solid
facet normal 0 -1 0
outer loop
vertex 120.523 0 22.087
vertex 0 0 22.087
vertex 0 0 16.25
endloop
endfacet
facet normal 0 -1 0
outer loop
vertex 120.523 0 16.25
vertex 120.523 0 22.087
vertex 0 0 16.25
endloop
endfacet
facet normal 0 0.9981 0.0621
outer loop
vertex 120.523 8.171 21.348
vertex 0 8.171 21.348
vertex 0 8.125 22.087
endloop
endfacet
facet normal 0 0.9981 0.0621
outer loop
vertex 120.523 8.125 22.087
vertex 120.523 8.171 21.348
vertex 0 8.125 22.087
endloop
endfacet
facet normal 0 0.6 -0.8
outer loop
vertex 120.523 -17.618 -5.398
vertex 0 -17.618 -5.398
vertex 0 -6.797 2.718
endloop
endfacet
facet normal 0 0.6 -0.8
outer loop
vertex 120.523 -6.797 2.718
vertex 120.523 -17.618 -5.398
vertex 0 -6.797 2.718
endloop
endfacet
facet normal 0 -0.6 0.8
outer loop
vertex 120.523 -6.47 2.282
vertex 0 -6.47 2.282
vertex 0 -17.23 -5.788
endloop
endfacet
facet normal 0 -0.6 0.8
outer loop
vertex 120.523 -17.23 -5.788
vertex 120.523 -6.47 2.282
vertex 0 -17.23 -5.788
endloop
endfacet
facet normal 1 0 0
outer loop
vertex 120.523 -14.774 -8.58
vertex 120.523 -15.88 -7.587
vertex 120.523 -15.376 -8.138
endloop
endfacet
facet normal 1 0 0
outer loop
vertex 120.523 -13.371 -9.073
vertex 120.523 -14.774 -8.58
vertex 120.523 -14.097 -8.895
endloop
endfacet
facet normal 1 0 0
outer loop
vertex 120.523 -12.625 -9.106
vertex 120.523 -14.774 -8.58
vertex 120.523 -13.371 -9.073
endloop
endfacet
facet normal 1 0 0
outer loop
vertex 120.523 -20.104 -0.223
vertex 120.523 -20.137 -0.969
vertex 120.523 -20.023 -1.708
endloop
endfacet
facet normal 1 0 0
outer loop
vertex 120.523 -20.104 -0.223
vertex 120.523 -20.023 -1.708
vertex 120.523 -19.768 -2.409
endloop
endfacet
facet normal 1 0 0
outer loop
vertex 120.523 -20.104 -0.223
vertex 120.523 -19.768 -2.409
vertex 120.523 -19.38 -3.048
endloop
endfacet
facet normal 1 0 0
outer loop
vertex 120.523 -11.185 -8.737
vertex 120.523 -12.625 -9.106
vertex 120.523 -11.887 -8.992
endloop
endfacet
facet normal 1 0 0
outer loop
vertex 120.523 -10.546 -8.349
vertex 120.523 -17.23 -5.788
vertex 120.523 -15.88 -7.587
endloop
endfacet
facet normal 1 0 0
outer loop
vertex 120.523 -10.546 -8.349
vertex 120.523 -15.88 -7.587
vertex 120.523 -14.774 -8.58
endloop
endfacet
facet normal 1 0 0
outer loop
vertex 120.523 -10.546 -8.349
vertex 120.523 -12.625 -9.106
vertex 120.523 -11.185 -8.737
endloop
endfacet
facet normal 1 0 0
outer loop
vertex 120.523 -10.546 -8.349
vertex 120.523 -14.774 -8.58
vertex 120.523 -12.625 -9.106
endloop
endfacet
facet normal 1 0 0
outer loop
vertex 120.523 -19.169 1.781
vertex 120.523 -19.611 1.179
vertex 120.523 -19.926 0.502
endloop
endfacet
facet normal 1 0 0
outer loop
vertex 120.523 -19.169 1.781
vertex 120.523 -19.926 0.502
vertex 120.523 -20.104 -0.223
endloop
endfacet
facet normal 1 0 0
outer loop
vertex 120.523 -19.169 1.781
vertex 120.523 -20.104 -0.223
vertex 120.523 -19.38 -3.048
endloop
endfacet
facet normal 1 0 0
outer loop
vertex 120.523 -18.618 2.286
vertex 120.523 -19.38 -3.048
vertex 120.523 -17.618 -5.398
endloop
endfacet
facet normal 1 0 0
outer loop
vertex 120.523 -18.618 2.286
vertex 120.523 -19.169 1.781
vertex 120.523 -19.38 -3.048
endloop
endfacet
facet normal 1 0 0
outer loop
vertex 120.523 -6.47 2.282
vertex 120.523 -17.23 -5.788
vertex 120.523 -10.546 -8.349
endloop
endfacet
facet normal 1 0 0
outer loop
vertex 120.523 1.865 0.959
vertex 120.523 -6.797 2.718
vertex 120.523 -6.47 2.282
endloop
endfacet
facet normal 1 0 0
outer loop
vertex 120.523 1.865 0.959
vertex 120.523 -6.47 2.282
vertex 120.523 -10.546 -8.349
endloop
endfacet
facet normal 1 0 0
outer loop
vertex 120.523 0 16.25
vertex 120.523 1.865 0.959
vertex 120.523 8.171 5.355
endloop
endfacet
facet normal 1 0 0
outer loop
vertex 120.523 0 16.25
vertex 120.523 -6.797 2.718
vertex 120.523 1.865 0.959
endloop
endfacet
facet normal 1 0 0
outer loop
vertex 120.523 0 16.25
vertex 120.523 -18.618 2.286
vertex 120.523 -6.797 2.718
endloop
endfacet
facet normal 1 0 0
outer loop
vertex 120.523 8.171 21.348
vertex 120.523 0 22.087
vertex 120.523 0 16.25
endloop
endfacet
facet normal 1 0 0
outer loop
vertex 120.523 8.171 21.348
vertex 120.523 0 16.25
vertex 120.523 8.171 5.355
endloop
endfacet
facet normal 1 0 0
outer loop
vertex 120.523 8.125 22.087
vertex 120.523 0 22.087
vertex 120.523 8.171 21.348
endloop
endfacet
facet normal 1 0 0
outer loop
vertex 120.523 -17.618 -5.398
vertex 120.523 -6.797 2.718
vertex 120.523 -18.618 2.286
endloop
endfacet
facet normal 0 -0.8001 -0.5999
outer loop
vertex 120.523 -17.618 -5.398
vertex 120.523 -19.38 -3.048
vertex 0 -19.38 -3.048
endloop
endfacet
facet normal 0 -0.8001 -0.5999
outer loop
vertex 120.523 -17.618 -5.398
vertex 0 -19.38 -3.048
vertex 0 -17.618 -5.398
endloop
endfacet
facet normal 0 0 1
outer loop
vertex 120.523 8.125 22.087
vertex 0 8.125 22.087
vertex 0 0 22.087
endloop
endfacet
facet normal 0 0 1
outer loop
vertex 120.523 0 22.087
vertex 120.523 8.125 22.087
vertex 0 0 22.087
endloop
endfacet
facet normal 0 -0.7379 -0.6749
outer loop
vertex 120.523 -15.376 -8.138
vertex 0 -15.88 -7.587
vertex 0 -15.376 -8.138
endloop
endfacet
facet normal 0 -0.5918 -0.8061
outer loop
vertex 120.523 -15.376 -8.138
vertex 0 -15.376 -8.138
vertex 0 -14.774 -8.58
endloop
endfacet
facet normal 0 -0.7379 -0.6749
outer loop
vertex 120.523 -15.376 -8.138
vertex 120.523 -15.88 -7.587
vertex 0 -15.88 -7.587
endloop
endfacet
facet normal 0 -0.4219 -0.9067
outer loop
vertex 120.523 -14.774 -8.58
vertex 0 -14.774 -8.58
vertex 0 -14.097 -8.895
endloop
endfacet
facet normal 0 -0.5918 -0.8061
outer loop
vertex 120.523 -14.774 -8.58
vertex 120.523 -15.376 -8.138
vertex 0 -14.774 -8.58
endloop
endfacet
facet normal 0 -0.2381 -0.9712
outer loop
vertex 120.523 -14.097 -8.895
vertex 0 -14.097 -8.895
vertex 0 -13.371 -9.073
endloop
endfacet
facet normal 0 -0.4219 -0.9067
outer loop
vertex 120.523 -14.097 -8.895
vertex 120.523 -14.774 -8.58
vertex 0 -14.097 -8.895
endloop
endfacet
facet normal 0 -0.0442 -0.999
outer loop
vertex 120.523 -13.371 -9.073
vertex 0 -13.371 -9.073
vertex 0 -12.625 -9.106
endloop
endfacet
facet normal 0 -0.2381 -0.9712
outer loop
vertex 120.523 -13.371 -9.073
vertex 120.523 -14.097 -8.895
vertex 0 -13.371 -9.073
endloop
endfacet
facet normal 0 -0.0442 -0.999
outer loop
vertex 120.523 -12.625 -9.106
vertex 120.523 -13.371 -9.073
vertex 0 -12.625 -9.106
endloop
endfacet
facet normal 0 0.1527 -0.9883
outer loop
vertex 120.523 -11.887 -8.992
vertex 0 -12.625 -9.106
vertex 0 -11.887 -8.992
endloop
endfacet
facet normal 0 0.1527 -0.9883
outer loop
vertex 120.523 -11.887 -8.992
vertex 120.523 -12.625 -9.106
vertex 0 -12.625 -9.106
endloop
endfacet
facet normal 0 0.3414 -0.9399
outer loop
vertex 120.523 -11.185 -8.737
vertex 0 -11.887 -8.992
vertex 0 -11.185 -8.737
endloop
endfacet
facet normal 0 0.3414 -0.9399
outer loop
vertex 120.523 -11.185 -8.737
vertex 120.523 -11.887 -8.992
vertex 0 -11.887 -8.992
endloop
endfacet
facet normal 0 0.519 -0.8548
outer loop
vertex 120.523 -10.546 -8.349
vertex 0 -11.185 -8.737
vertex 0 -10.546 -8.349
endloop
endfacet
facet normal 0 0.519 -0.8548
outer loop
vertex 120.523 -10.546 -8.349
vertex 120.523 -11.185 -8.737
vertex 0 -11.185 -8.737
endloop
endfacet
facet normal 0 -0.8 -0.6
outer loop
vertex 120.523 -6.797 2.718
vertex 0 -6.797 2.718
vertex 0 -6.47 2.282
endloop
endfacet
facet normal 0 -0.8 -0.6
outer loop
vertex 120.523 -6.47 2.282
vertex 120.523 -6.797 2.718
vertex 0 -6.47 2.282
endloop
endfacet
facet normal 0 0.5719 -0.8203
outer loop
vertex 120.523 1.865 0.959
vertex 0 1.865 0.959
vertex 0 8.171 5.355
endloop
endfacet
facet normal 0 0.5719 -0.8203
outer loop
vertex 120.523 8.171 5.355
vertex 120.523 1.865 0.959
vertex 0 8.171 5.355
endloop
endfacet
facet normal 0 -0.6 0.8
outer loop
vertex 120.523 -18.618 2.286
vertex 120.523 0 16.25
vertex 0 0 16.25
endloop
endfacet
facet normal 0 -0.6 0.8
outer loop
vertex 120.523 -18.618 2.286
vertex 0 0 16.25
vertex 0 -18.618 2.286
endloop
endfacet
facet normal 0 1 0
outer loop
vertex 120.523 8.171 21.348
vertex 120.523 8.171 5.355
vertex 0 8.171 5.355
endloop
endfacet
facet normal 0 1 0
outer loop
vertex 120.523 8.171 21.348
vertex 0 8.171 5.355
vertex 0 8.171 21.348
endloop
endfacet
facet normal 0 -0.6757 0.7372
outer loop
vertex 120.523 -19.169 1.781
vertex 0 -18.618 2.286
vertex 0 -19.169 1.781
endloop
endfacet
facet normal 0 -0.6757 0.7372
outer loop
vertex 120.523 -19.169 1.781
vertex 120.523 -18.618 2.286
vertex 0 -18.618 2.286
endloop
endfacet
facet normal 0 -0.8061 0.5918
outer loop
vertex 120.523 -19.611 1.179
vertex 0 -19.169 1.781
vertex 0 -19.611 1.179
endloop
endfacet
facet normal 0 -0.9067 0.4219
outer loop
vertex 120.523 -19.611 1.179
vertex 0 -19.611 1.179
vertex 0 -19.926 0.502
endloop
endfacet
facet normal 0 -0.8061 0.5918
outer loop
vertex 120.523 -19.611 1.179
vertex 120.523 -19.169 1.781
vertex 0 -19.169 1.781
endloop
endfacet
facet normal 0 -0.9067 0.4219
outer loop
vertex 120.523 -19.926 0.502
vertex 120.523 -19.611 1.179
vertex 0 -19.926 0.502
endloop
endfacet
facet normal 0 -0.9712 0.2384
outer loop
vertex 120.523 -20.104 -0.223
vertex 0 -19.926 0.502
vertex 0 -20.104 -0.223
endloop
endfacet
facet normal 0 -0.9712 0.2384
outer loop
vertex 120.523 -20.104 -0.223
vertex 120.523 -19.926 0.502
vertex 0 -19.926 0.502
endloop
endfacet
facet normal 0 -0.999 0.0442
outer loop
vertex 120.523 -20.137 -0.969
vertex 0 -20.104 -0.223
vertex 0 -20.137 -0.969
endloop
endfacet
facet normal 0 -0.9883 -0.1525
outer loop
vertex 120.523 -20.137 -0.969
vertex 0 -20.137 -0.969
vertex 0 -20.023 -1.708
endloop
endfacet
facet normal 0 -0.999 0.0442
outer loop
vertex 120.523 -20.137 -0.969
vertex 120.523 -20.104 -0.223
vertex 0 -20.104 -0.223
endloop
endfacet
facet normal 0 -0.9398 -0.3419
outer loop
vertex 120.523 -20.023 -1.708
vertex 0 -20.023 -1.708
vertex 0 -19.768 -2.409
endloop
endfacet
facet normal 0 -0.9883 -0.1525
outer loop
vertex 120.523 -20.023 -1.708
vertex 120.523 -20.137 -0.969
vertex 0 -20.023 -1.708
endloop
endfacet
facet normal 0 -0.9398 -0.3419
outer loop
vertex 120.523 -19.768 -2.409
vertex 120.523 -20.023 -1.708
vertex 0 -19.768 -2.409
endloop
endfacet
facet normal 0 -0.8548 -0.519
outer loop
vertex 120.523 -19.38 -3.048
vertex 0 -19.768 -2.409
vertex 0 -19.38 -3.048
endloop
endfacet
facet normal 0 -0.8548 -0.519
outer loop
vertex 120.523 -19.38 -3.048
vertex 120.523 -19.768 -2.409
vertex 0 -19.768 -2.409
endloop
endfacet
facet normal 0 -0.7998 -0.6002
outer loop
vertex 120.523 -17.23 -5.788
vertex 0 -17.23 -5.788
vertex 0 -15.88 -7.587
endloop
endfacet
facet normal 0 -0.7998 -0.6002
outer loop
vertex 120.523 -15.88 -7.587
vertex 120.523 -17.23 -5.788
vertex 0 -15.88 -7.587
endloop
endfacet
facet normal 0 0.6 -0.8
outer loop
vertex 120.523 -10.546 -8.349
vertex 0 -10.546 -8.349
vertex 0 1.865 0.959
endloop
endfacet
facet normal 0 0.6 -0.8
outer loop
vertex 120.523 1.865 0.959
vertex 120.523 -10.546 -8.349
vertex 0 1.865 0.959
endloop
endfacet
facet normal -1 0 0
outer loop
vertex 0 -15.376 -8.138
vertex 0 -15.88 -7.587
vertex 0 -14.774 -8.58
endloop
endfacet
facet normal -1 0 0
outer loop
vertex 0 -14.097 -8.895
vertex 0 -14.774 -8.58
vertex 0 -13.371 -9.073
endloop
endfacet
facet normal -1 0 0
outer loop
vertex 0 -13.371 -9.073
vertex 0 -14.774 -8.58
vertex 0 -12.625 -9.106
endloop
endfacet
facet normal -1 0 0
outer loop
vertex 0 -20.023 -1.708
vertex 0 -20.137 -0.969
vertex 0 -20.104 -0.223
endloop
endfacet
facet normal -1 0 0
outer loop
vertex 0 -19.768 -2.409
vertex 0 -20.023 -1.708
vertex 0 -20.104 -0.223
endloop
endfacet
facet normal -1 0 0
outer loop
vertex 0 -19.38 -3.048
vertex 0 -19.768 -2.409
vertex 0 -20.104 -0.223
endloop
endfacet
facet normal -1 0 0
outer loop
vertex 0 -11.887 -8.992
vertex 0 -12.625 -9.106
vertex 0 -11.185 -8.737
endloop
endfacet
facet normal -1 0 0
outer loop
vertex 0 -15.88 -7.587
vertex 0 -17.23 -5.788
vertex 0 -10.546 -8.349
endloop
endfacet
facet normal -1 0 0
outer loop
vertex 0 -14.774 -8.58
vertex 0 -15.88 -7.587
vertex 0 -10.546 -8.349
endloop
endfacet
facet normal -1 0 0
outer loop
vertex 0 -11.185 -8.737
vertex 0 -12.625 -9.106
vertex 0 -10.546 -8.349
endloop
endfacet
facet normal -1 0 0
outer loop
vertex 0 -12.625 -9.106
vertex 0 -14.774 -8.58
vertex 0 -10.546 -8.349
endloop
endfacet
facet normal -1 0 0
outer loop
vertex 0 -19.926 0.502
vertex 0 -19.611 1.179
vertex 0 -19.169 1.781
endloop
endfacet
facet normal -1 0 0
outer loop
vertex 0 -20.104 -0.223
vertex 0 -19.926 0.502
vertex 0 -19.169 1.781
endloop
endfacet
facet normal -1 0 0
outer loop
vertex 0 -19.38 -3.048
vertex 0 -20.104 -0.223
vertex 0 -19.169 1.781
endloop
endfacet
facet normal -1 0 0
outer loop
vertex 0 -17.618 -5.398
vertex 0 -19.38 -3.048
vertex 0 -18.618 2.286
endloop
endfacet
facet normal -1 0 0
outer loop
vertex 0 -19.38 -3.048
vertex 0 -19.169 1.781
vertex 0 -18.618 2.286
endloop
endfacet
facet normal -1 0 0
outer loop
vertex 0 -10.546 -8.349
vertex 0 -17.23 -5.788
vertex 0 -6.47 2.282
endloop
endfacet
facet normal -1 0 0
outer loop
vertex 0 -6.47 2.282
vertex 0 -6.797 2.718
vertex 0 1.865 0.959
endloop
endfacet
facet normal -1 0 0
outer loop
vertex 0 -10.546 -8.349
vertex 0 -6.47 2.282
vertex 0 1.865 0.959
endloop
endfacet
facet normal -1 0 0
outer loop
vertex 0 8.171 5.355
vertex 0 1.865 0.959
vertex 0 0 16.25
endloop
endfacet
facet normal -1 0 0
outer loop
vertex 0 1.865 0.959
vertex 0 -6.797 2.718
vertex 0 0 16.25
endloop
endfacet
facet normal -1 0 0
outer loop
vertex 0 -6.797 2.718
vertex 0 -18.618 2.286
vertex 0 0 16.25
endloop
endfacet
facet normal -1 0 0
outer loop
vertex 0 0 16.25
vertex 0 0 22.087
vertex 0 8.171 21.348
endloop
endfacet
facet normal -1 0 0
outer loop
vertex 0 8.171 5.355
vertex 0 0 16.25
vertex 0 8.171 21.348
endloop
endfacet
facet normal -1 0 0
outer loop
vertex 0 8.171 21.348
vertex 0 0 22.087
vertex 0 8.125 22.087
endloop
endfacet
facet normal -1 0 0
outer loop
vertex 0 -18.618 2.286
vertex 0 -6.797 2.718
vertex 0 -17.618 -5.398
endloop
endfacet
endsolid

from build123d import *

# Parameters (mm, degrees)
F1_DEPTH = 120.523
F2_R     = 3.81


with BuildPart() as f1:
    # F0 (on Right) → F1 (new body)
    with BuildSketch(Plane.YZ):
        Polygon((8.171235, 5.354634), (0, 16.249614), (-21.666151, 0), (-17.617675, -5.397966), (-6.796981, 2.717555), (-6.470074, 2.281679), (-17.229717, -5.788053), (-13.594393, -10.63515), (1.864555, 0.959061), align=None)
        Polygon((0, 22.087431), (0, 16.249614), (8.171235, 5.354634), (8.171235, 21.347754), (8.125494, 22.087431), align=None)
    extrude(amount=F1_DEPTH)

    # F2
    f2_edges = [f1.edges().sort_by_distance(p)[0] for p in [
        (60.2615, -21.666151, 0),
        (60.2615, -13.594393, -10.63515),
    ]]
    fillet(f2_edges, radius=F2_R)


solid = f1.part
